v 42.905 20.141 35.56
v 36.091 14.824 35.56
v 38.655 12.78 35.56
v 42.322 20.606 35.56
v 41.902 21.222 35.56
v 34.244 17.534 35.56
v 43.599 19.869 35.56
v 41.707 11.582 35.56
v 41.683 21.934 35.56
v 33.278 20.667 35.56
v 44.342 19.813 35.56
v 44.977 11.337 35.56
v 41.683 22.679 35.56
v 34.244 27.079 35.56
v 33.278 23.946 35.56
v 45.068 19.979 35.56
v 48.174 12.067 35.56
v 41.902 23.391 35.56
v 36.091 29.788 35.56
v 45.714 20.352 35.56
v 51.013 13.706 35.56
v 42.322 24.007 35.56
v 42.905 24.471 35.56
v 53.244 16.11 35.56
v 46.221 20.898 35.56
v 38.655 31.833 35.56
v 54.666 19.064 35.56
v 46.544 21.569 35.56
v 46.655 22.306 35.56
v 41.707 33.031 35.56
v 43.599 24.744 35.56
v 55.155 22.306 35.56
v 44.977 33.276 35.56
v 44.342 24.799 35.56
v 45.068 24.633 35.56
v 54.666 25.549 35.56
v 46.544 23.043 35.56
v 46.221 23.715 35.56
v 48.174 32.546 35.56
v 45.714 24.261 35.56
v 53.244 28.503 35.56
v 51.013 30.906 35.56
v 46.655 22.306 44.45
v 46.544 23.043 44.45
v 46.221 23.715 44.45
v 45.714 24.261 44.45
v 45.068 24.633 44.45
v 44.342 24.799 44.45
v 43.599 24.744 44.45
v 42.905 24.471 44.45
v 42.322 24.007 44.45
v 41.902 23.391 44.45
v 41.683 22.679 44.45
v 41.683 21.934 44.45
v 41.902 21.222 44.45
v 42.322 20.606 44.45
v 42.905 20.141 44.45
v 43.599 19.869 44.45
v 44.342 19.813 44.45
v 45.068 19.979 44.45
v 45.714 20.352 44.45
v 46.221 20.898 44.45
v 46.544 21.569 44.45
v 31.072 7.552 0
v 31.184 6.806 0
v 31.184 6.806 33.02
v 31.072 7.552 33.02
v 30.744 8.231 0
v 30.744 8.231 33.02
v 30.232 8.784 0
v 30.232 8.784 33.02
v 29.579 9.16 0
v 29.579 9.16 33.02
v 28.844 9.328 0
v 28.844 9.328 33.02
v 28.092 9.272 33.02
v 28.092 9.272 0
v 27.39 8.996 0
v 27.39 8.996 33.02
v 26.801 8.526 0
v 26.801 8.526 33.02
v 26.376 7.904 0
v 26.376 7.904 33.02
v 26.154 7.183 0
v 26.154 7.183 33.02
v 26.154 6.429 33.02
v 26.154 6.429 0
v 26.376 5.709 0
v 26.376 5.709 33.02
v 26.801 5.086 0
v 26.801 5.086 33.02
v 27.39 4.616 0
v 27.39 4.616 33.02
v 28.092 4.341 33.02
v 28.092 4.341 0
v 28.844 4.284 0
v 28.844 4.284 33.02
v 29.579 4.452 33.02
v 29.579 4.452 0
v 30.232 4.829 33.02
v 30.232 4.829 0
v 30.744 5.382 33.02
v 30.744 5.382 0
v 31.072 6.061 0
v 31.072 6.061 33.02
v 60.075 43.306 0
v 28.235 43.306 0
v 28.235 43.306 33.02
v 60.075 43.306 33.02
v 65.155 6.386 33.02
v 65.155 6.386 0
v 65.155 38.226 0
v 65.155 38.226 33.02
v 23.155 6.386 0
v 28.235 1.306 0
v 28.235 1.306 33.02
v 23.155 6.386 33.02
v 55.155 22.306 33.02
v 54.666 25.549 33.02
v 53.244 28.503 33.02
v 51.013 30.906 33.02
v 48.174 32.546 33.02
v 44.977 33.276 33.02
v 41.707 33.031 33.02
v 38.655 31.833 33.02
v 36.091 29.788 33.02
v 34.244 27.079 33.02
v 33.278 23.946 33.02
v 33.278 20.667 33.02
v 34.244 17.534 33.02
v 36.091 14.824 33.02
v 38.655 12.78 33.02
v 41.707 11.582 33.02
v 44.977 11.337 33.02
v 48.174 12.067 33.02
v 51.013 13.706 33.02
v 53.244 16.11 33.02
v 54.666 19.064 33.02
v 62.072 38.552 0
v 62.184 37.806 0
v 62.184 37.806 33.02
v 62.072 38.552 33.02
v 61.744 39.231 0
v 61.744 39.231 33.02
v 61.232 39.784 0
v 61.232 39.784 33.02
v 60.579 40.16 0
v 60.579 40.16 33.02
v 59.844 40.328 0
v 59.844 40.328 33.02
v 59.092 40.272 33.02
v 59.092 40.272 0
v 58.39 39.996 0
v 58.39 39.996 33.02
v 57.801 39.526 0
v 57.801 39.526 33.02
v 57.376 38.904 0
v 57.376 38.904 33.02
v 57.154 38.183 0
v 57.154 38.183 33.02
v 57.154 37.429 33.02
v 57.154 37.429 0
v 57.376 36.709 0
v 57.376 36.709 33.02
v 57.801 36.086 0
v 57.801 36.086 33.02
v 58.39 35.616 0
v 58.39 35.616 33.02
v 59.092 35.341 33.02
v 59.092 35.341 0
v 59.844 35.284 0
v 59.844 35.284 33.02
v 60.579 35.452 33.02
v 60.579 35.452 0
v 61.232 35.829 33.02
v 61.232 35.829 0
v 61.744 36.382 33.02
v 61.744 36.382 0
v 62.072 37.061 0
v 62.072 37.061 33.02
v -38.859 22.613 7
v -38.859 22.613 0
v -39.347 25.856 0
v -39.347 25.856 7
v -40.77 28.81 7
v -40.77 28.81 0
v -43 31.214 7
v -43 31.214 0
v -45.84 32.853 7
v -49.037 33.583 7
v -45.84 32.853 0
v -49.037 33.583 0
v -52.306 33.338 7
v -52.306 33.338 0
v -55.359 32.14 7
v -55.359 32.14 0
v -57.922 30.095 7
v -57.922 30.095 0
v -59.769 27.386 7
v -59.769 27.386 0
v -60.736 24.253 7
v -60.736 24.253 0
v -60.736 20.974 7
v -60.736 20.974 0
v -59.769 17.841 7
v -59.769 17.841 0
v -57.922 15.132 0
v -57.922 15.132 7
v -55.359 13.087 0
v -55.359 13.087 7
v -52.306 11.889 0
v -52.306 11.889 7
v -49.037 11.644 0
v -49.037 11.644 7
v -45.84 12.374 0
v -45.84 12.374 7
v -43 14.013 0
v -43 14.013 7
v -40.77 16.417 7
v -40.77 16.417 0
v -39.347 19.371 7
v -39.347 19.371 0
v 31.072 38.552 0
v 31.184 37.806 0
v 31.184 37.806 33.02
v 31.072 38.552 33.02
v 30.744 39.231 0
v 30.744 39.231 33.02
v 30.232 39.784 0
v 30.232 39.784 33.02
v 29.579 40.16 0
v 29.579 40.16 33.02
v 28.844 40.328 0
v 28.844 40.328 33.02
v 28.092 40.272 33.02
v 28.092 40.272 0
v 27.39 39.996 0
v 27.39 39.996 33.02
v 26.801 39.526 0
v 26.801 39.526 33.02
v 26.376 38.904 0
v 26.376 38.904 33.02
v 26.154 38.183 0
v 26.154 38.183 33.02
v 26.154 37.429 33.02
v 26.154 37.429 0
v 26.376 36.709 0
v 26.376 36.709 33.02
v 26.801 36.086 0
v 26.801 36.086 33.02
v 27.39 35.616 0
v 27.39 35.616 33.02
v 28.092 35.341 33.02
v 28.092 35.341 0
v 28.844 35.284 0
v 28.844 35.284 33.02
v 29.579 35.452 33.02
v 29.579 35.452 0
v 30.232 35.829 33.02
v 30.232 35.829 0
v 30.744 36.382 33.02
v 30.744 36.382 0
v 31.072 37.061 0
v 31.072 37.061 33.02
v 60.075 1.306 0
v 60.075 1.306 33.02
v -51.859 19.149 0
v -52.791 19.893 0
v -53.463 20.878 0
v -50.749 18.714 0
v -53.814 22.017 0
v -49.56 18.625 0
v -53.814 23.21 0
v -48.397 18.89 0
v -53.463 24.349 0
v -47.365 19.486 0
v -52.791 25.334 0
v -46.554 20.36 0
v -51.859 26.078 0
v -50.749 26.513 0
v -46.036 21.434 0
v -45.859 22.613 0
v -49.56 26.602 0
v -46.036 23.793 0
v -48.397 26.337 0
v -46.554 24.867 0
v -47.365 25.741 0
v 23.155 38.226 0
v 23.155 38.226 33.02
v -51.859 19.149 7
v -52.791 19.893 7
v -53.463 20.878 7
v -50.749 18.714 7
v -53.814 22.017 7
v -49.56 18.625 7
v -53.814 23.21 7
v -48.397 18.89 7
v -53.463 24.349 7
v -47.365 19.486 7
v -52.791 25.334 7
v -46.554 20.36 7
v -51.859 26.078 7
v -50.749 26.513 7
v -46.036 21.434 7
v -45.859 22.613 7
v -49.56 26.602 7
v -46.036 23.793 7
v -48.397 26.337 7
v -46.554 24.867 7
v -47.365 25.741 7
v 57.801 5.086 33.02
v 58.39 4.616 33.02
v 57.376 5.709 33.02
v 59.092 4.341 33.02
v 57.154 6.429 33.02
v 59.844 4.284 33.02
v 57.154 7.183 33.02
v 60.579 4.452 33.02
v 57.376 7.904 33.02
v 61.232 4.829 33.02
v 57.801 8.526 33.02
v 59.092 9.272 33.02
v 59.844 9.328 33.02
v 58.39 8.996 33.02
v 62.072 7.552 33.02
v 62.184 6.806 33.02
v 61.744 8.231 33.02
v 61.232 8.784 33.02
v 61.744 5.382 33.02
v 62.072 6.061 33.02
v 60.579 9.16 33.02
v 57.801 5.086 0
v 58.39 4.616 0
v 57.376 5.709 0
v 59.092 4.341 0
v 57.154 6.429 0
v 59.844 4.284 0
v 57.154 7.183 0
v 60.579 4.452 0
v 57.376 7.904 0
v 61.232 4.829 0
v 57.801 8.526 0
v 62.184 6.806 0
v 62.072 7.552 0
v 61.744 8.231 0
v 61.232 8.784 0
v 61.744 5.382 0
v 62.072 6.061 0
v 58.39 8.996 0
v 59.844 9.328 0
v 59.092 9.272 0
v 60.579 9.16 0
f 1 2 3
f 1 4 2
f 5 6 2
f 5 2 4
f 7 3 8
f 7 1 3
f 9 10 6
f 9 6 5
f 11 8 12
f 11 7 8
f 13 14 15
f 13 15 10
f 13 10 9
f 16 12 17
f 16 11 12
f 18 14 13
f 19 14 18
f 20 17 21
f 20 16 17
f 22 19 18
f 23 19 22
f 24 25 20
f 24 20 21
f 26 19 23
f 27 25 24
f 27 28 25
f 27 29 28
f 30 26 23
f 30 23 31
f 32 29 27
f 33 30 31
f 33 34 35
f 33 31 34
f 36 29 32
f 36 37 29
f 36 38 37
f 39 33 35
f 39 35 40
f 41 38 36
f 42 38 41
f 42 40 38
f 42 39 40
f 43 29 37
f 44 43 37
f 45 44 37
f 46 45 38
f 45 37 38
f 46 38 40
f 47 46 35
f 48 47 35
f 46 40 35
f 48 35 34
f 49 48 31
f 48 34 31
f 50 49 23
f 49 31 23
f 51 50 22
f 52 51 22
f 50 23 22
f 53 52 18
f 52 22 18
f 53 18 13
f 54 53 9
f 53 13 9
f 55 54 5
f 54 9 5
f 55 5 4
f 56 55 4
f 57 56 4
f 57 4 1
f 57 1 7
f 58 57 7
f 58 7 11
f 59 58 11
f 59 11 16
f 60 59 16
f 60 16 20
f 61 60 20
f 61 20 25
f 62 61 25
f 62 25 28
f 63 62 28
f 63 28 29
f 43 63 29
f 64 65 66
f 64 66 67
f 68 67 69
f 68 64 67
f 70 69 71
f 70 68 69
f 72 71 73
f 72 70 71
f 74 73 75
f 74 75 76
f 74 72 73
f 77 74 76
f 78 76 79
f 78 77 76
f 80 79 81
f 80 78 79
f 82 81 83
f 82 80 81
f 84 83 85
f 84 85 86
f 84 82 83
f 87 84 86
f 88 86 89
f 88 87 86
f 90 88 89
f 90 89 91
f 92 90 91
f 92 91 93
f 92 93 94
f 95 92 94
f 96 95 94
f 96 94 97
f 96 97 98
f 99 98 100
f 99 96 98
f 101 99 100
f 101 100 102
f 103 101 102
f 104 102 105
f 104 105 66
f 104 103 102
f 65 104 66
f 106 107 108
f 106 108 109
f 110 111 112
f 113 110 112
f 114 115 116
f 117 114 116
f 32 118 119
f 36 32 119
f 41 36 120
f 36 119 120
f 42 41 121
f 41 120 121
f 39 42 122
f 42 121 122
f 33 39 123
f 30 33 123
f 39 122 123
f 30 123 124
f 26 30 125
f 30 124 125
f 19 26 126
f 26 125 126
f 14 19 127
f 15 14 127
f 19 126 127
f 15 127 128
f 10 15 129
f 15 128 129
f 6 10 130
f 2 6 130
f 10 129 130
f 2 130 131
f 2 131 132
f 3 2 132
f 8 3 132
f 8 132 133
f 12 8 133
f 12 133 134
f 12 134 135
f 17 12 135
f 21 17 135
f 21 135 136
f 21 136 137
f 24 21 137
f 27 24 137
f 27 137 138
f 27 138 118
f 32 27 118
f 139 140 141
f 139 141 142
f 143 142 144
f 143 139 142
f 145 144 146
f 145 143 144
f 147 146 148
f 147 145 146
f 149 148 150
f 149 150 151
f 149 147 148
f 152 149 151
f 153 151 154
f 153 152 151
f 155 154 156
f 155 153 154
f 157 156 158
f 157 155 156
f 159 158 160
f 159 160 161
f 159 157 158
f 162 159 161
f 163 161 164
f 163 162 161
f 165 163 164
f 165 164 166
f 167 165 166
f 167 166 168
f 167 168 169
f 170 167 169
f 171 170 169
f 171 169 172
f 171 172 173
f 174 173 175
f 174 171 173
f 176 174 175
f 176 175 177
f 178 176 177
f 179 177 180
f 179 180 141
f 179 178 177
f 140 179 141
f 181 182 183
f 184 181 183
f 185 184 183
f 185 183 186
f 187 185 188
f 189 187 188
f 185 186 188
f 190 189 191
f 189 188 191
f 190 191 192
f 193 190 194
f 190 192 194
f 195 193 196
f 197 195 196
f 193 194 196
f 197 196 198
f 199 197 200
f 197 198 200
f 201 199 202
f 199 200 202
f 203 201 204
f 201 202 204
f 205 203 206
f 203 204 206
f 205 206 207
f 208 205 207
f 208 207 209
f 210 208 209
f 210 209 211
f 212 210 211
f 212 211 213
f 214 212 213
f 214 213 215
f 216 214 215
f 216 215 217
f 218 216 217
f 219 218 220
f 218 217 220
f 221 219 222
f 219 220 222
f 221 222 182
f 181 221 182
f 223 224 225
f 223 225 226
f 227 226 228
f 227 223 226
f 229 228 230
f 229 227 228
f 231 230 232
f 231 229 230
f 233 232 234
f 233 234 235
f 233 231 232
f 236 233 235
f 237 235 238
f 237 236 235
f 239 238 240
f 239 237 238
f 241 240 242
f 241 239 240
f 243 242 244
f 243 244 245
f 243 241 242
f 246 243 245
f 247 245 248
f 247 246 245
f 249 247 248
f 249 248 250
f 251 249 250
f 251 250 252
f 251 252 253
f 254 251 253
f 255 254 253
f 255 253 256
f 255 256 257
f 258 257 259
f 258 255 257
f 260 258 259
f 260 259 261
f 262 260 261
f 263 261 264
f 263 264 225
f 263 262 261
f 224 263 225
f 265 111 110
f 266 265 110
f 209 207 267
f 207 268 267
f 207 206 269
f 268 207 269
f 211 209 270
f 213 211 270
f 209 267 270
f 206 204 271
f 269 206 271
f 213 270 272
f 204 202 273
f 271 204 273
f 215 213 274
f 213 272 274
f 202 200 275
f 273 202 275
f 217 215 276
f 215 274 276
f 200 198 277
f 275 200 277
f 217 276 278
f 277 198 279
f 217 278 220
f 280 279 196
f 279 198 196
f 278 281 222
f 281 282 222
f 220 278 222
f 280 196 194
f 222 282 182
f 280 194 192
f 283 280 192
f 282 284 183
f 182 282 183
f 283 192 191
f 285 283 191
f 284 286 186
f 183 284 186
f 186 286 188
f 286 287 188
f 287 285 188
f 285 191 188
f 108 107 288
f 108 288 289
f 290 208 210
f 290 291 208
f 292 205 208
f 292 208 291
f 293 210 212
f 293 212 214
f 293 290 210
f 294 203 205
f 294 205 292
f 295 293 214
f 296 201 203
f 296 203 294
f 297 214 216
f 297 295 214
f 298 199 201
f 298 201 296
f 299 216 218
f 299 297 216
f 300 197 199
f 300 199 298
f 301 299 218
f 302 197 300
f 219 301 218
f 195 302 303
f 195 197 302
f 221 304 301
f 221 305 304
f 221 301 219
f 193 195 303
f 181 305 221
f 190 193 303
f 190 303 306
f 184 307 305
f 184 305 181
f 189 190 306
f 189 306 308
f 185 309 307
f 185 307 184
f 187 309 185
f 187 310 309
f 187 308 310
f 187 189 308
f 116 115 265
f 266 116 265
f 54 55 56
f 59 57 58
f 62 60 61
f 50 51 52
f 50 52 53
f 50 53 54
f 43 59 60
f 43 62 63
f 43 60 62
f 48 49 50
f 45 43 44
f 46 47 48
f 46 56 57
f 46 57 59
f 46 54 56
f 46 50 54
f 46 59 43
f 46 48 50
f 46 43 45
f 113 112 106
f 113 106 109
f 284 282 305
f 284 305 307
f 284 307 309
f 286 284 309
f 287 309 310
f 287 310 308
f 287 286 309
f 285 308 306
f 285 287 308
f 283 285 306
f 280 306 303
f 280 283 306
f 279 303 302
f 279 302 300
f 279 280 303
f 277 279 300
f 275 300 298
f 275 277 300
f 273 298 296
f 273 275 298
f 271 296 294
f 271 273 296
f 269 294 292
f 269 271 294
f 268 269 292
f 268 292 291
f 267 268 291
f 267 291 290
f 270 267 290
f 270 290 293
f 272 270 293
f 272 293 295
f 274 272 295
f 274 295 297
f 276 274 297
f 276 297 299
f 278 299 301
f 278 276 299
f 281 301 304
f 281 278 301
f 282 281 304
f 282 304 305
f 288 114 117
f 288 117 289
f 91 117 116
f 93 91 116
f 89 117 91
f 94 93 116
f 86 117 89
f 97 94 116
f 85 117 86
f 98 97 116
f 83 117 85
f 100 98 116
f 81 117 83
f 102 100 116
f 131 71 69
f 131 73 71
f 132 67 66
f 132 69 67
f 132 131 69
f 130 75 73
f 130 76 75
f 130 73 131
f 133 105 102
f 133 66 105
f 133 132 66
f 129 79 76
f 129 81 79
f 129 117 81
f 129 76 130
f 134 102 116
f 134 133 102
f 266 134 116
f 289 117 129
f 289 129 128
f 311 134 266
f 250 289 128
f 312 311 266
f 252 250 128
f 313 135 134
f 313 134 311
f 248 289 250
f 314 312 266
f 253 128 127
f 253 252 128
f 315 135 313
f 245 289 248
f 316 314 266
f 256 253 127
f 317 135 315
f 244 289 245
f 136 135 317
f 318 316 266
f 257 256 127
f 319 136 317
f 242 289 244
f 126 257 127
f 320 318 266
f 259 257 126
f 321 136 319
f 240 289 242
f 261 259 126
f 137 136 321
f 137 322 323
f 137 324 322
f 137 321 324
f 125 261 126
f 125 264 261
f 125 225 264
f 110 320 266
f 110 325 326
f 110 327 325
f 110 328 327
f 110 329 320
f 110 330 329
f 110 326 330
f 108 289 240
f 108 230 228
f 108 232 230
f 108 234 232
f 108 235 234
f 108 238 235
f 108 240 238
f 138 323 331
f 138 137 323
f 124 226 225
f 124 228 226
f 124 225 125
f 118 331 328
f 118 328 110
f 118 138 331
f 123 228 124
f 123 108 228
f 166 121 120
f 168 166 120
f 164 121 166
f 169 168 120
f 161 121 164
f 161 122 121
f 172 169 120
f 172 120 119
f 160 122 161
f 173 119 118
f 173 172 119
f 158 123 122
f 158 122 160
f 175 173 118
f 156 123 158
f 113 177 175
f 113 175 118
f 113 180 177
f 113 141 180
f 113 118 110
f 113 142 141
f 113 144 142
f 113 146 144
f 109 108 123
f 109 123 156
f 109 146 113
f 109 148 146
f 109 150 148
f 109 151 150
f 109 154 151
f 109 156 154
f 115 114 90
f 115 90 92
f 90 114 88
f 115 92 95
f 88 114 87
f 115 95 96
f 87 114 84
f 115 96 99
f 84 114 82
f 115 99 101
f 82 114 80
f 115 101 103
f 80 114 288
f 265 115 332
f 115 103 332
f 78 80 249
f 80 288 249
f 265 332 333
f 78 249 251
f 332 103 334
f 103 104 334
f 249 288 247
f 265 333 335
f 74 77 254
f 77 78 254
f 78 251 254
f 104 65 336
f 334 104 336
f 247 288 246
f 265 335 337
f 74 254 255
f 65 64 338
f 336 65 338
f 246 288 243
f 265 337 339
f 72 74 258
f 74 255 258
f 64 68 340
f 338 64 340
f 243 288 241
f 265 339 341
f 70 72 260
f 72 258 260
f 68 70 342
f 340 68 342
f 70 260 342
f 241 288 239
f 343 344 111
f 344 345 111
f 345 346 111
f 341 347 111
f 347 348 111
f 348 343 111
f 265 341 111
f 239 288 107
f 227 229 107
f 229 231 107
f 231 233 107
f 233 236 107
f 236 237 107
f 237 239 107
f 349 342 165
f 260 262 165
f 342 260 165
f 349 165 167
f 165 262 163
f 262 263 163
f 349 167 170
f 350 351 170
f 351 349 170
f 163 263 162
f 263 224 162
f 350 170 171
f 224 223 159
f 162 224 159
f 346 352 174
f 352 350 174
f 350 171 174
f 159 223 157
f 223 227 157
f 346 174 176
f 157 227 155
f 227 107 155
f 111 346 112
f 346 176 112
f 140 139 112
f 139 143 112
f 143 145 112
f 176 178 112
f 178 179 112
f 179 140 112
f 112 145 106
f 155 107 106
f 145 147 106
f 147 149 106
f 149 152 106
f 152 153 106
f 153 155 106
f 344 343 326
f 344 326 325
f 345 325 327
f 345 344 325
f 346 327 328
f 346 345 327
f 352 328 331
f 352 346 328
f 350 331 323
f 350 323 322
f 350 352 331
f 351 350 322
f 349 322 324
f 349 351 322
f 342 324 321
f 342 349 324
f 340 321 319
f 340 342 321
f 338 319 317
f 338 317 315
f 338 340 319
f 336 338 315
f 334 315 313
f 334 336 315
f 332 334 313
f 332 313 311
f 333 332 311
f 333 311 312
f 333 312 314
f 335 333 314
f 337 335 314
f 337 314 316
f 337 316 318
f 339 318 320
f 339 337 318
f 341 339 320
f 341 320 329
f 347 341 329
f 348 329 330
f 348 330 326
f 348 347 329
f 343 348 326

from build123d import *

# Parameters (mm, degrees)
F0_R     = 11
F0_R_2   = 4
F1_DEPTH = 7
F2_W     = 42
F2_H     = 42
F2_R     = 2.528972
F2_R_2   = 11
F3_DEPTH = 33.02
F2_R_3   = 2.5
F4_DEPTH = 35.56
F5_DEPTH = 44.45
F6_SIZE  = 5.08


with BuildPart() as f1:
    # F0 (on Top) → F1 (new body)
    with BuildSketch(Plane.XY):
        with Locations((-49.858671, 22.613496)):
            Circle(F0_R)
        with Locations((-49.858671, 22.613496)):
            Circle(F0_R_2, mode=Mode.SUBTRACT)
    extrude(amount=F1_DEPTH)


with BuildPart() as f3:
    # F2 (on Top) → F3 (new body)
    with BuildSketch(Plane.XY):
        with Locations((44.154914, 22.30631)):
            Rectangle(F2_W, F2_H)
        with Locations((28.654914, 6.80631)):
            Circle(F2_R, mode=Mode.SUBTRACT)
        with Locations((59.654914, 6.80631)):
            Circle(F2_R, mode=Mode.SUBTRACT)
        with Locations((28.654914, 37.80631)):
            Circle(F2_R, mode=Mode.SUBTRACT)
        with Locations((44.154914, 22.30631)):
            Circle(F2_R_2, mode=Mode.SUBTRACT)
        with Locations((59.654914, 37.80631)):
            Circle(F2_R, mode=Mode.SUBTRACT)
    extrude(amount=F3_DEPTH)

    # F2 (on Top) → F4 (join)
    with BuildSketch(Plane.XY):
        with Locations((44.154914, 22.30631)):
            Circle(F2_R_2)
        with Locations((44.154914, 22.30631)):
            Circle(F2_R_3, mode=Mode.SUBTRACT)
    extrude(amount=F4_DEPTH)

    # F2 (on Top) → F5 (join)
    with BuildSketch(Plane.XY):
        with Locations((44.154914, 22.30631)):
            Circle(F2_R_3)
    extrude(amount=F5_DEPTH)

    # F6
    f6_edges = [f3.edges().sort_by_distance(p)[0] for p in [
        (23.154914, 43.30631, 16.51),
        (23.154914, 1.30631, 16.51),
        (65.154914, 1.30631, 16.51),
        (65.154914, 43.30631, 16.51),
    ]]
    chamfer(f6_edges, length=F6_SIZE)


solid = Compound([f1.part, f3.part])
